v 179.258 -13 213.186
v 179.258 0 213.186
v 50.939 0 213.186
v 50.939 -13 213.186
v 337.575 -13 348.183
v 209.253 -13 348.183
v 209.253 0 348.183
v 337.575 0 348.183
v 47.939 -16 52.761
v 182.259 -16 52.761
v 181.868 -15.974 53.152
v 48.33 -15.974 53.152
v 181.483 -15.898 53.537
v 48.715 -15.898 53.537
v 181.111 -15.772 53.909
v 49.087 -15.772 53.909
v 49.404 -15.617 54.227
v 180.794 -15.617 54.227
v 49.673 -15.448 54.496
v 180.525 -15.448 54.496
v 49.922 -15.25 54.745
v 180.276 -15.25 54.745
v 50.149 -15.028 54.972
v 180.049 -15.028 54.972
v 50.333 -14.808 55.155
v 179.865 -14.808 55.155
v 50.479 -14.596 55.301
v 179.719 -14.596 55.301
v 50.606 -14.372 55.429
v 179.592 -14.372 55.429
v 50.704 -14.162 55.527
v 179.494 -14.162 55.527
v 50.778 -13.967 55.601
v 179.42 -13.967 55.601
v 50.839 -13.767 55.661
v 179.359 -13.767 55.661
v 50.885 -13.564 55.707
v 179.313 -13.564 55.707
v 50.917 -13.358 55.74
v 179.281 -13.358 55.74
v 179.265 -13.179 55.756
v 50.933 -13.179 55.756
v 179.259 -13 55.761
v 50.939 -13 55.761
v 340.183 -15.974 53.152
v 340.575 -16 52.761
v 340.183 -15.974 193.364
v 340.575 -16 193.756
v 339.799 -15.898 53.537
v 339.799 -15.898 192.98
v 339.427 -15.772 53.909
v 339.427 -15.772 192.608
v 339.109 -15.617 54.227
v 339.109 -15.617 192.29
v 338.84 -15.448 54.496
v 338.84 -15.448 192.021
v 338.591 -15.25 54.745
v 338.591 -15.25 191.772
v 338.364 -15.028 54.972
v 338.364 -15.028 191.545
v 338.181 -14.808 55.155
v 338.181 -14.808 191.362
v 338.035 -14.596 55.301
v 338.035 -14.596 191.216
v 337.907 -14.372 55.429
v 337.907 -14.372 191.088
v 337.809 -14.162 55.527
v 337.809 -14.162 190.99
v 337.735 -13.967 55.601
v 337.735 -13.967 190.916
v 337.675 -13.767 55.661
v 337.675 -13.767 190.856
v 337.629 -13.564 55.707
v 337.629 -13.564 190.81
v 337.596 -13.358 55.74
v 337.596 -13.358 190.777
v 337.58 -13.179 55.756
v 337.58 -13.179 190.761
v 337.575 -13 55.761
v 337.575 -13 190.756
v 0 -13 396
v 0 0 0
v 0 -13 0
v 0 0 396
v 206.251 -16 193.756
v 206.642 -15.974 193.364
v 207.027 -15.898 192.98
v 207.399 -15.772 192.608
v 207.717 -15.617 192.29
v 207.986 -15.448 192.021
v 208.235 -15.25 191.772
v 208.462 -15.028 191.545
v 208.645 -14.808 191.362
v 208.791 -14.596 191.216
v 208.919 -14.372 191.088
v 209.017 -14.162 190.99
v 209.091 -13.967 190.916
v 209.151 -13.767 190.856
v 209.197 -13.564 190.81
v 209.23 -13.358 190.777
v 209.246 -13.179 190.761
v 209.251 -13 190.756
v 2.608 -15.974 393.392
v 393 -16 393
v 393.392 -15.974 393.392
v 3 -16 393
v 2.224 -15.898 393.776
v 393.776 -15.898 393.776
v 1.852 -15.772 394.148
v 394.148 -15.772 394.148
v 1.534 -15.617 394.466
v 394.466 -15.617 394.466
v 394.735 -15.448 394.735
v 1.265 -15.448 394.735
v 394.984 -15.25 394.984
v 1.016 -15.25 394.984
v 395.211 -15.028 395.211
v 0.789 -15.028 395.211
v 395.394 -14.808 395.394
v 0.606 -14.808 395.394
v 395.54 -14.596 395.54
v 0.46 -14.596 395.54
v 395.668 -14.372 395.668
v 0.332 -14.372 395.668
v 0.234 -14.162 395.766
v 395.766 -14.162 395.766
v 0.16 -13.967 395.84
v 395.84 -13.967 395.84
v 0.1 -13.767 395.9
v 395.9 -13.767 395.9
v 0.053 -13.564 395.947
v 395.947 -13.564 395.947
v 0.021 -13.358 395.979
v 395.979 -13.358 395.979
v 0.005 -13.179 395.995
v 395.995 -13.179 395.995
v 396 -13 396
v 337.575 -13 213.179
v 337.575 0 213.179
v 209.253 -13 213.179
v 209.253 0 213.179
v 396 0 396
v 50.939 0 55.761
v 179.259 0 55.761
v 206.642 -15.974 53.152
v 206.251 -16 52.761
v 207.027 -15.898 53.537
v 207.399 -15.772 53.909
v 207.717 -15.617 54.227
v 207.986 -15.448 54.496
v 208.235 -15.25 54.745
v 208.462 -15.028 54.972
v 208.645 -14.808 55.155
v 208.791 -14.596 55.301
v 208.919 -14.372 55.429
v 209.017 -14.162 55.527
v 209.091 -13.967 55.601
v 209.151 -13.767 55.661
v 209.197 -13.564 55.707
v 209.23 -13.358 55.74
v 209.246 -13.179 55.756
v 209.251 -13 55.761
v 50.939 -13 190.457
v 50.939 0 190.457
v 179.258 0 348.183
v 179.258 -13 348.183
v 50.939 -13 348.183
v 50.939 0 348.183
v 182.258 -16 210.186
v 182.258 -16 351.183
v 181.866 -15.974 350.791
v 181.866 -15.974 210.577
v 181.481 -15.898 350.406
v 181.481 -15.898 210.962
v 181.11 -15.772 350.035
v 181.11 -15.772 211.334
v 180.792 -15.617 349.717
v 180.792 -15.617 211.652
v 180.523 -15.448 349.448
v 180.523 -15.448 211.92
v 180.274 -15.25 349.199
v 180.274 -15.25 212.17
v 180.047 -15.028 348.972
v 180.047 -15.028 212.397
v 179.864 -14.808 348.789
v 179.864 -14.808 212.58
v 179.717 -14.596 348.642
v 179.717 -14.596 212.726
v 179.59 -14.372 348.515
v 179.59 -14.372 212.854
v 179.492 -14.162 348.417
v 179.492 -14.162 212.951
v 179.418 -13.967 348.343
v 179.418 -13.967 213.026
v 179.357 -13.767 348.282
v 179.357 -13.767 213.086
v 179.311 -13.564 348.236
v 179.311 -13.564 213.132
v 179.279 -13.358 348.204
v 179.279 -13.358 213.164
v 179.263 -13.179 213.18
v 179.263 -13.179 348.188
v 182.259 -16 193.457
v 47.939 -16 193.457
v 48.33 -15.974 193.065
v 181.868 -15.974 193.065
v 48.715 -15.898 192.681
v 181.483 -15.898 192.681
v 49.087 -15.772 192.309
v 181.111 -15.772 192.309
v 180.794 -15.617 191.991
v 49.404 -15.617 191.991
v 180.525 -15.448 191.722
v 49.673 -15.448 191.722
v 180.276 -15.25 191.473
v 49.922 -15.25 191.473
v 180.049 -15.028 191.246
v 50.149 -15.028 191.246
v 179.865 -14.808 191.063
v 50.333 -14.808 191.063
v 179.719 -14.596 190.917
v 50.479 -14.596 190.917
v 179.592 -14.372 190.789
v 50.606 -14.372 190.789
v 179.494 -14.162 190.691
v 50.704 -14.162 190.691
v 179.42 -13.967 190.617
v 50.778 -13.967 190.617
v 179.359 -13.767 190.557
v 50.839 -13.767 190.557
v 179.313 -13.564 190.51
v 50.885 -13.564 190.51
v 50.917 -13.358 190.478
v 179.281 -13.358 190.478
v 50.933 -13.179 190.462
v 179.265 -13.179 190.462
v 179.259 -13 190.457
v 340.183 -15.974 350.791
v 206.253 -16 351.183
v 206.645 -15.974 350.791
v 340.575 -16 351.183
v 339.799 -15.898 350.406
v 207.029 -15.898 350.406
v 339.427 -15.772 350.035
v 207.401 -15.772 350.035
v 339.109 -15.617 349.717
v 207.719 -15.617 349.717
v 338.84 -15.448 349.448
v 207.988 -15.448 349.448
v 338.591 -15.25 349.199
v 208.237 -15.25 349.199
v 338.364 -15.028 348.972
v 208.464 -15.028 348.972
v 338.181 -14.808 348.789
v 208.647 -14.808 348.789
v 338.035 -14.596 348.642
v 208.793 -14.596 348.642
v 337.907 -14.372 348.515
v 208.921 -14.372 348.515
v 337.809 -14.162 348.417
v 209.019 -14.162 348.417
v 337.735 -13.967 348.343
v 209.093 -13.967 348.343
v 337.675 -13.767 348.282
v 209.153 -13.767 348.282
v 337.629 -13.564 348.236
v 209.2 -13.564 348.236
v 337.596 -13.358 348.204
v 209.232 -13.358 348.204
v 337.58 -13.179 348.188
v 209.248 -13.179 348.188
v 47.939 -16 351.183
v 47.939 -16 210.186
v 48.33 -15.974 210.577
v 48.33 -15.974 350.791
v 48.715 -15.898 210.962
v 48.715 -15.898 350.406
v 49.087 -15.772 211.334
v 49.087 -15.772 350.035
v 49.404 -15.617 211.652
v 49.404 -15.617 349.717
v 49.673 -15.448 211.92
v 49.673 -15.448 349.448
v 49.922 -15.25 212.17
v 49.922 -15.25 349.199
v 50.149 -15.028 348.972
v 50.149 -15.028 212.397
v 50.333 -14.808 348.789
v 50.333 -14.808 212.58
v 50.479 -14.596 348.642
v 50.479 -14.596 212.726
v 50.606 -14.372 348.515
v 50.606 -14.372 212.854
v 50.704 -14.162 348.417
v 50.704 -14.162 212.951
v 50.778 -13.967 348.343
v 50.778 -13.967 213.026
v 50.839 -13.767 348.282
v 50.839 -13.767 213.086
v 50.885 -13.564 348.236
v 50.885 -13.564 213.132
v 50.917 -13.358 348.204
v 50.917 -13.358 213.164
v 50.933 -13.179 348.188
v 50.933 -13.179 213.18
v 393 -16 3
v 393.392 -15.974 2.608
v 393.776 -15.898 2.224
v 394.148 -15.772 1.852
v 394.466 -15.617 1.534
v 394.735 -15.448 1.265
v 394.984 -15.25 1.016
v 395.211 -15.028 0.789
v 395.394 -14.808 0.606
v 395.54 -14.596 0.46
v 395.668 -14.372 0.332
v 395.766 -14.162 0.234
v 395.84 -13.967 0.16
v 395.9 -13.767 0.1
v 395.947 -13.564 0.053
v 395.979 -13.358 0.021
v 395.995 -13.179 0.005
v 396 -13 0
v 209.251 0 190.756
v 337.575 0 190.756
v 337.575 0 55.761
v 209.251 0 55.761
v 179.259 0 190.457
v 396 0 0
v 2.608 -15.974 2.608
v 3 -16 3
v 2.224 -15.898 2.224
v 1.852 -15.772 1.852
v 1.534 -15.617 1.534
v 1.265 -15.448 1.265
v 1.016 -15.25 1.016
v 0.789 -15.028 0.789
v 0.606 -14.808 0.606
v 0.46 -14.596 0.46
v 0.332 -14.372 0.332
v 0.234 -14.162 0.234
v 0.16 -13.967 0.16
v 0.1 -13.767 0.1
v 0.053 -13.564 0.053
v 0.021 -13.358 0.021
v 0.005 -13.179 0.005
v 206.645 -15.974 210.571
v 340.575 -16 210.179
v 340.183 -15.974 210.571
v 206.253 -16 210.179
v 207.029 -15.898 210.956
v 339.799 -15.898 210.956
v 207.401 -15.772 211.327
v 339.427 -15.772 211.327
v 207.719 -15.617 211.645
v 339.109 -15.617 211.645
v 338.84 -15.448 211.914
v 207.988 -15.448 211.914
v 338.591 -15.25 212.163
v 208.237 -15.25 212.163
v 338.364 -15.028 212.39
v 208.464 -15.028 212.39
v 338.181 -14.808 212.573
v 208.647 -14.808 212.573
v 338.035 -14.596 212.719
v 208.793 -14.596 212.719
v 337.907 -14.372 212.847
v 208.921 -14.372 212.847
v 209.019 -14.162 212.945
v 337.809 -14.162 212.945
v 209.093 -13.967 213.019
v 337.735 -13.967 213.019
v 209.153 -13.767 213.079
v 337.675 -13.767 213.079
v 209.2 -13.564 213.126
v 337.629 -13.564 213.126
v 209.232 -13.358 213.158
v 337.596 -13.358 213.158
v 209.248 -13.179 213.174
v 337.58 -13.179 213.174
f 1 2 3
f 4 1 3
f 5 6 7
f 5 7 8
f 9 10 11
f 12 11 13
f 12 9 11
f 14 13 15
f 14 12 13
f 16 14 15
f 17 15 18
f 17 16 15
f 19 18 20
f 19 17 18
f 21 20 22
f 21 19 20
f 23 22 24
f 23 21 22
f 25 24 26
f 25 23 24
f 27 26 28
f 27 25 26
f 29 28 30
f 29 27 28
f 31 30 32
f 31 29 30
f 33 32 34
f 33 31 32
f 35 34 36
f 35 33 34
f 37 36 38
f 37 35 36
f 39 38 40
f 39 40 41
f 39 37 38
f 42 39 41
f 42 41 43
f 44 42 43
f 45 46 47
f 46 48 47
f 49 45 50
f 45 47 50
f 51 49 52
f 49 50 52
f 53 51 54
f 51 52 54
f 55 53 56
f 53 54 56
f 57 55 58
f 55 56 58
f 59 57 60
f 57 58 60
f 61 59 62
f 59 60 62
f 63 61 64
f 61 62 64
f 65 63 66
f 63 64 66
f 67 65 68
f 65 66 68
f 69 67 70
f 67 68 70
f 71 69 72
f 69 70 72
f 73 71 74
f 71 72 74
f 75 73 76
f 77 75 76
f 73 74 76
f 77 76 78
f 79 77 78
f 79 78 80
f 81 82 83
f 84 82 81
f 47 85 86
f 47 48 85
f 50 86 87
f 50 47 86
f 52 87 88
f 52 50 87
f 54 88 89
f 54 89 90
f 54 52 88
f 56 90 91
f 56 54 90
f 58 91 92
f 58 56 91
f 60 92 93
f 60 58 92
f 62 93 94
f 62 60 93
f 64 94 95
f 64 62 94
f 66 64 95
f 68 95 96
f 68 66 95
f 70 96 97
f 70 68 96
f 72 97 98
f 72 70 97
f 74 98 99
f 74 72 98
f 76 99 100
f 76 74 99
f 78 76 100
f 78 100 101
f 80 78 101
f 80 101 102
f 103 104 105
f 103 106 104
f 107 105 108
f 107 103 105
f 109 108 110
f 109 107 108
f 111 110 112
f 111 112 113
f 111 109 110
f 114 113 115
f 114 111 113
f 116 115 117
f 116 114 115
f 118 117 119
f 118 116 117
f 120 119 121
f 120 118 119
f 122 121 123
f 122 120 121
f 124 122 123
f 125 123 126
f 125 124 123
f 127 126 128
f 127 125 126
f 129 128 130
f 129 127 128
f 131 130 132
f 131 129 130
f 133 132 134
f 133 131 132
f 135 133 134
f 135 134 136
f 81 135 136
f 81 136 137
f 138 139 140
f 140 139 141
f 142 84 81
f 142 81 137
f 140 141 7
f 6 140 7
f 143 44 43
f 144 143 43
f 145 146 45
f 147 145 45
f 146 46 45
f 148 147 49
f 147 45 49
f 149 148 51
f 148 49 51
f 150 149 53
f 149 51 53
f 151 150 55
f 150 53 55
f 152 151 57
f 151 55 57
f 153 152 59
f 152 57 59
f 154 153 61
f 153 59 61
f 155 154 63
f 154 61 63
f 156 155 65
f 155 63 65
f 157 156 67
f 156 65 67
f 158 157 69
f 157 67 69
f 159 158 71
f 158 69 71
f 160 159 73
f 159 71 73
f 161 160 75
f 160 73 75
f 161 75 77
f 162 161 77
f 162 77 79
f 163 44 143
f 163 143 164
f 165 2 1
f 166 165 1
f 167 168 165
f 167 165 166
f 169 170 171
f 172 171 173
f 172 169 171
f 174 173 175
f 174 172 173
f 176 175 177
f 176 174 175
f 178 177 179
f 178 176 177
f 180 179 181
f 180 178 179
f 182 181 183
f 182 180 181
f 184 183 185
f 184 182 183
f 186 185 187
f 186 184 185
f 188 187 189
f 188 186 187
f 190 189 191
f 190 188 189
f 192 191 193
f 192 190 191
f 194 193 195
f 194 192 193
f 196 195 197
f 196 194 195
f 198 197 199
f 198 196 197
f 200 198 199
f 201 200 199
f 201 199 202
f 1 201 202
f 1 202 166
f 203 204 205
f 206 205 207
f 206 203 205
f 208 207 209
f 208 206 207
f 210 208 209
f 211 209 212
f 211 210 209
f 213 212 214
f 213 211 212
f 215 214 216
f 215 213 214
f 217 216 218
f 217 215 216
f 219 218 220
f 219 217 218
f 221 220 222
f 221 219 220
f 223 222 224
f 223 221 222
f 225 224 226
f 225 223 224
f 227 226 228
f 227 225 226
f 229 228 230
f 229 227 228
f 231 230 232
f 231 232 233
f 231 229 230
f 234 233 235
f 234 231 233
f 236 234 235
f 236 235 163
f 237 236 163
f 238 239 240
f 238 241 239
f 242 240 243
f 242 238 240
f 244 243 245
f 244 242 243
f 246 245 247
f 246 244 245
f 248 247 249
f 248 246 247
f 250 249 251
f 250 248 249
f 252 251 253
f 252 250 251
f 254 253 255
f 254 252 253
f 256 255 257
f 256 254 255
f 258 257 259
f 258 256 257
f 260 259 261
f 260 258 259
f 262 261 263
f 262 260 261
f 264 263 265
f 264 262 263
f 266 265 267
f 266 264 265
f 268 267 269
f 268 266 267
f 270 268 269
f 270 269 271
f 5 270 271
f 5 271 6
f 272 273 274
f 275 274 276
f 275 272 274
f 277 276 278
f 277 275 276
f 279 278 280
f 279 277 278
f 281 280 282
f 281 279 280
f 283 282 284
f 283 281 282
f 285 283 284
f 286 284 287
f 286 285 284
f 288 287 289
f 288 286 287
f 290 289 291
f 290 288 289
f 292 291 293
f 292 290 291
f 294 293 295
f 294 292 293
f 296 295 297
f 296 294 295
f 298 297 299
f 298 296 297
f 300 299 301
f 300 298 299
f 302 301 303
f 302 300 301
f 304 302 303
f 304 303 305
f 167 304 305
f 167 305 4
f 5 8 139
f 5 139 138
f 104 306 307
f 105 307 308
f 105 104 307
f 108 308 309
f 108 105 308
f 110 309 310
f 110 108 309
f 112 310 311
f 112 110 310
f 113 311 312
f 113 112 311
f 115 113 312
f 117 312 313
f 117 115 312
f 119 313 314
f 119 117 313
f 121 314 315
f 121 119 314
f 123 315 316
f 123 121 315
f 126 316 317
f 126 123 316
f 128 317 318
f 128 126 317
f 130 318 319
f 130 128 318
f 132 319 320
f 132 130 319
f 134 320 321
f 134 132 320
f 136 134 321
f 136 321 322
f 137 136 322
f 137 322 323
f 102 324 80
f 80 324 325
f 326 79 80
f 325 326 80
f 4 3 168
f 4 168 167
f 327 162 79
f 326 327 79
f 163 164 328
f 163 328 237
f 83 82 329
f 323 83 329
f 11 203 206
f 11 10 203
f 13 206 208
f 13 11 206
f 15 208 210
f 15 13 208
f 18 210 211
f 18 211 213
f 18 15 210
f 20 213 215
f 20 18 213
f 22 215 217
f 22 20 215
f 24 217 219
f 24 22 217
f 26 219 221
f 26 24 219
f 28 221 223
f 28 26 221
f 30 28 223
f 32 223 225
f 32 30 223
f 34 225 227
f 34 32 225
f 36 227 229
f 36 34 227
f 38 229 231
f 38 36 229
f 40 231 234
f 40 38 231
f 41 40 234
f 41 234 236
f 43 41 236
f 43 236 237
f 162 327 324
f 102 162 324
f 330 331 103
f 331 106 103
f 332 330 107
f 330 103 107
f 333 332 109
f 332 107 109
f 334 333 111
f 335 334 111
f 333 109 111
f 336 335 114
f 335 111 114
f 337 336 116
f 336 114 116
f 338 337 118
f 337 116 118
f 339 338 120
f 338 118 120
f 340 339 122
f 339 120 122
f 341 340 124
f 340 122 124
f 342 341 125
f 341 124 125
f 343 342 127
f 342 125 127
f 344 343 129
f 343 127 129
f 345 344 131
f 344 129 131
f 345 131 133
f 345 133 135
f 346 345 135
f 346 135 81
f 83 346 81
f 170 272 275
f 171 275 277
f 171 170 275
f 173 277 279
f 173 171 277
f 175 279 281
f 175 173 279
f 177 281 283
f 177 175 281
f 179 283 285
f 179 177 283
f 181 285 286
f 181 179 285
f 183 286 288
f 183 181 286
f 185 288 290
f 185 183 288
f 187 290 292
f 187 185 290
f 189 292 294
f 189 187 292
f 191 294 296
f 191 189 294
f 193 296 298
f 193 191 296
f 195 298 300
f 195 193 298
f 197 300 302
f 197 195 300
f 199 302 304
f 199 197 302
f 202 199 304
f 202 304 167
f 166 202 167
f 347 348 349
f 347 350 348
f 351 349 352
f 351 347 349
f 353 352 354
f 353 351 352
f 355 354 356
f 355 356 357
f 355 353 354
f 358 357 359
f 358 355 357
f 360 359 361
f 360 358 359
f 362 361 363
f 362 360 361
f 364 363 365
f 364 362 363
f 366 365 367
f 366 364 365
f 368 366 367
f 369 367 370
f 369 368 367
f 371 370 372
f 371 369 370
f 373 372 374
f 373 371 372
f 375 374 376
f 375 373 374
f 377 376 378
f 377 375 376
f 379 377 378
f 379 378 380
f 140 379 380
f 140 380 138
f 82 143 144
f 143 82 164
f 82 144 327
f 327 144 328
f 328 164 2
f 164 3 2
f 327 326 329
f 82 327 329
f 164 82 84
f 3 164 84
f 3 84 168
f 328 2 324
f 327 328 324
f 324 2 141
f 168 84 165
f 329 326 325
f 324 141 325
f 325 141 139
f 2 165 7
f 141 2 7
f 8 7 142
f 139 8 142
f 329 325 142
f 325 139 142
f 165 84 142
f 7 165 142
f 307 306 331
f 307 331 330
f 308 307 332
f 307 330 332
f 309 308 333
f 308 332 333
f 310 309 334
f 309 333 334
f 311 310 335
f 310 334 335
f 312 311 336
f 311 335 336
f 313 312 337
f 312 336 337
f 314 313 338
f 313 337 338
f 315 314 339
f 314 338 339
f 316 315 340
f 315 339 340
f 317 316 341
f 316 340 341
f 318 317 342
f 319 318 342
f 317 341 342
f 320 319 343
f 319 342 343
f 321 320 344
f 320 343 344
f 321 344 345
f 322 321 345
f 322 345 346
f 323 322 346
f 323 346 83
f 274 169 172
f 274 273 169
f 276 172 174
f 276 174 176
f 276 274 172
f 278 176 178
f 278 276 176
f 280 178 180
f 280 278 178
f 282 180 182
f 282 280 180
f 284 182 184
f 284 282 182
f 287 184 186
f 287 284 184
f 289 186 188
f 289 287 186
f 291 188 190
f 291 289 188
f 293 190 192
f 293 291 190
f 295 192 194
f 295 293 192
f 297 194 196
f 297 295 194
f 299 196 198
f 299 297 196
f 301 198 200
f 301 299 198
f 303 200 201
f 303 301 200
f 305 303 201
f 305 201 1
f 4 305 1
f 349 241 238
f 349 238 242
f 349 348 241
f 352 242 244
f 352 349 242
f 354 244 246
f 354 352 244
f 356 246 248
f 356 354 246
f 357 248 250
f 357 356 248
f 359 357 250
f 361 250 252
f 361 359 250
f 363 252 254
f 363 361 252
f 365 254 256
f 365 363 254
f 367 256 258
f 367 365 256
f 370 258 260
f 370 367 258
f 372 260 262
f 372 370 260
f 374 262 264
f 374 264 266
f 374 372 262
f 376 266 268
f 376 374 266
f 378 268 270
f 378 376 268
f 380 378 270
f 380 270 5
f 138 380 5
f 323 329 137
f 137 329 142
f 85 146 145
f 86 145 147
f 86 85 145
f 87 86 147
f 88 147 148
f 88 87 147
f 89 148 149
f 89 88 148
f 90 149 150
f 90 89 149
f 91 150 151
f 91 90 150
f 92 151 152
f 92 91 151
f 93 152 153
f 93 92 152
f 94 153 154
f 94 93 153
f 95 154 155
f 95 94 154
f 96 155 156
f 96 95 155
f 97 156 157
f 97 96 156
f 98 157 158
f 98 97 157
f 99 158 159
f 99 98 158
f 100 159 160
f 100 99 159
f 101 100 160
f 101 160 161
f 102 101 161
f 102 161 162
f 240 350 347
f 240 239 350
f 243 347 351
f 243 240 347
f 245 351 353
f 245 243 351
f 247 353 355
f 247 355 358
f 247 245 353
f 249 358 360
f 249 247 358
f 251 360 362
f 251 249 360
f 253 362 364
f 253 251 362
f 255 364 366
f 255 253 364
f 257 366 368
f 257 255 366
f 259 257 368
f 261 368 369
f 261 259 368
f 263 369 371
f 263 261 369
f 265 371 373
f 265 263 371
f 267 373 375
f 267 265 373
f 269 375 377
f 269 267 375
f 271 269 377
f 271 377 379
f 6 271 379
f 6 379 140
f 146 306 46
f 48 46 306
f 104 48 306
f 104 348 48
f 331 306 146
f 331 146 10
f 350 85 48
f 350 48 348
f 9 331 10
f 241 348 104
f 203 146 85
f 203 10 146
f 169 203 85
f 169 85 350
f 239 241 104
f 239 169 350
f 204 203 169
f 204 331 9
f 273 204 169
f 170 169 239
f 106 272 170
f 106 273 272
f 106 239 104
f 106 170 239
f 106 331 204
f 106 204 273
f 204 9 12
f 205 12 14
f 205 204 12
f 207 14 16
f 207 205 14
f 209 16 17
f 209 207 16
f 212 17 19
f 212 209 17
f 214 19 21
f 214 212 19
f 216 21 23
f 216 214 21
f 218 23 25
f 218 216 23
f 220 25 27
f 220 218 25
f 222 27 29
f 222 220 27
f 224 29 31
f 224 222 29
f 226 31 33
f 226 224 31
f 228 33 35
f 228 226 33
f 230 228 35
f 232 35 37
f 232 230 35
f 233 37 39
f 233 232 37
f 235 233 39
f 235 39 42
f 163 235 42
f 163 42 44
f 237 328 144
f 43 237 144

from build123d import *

# Parameters (mm, degrees)
F0_W      = 46.2659336627
F0_H      = 37.4186895788
F1_DEPTH  = 16
F2_DEPTH  = 396
F3_DEPTH  = 396
F4_W      = 286.636531353
F4_H      = 292.4217879772
F5_DEPTH  = 5
F7_DEPTH  = 5
F8_DEPTH  = 24.58
F9_DEPTH  = 28.59
F10_DEPTH = 44.51
F11_DEPTH = 43.6
F12_DEPTH = 23.54
F13_DEPTH = 25.39
F14_DEPTH = 8.54
F15_DEPTH = 6.68
F16_DEPTH = 6.68
F17_DEPTH = 6.68
F18_DEPTH = 1.72
F19_DEPTH = 11
F20_R     = 3


with BuildPart() as f1:
    # F0 (on Front) → F1 (new body)
    with BuildSketch(Plane.XZ):
        with Locations((23.1329668313, 18.7093447894)):
            Rectangle(F0_W, F0_H)
    extrude(amount=F1_DEPTH)

    # F2 (add): a face of the model
    f2_faces = [f1.faces().sort_by_distance(p)[0] for p in [
        (0, -8, 18.7093447894),
    ]]
    extrude(f2_faces, amount=-F2_DEPTH)

    # F3 (add): a face of the model
    f3_faces = [f1.faces().sort_by_distance(p)[0] for p in [
        (198, -8, 0),
    ]]
    extrude(f3_faces, amount=-F3_DEPTH)

    # F4 (on face) → F5 (cut)
    with BuildSketch(Plane.XZ.offset(16)):
        with Locations((194.2568123341, 201.971784234)):
            Rectangle(F4_W, F4_H)
    extrude(amount=-F5_DEPTH, mode=Mode.SUBTRACT)

    # F6 (on face) → F7 (join)
    with BuildSketch(Plane.XZ.offset(11)):
        Polygon((211.1129611731, 348.1826782227), (162.3977422714, 348.1826782227), (162.3977422714, 257.6956450939), (50.9385466576, 257.6956450939), (50.9385466576, 215.037047863), (160.5494618416, 215.037047863), (160.5494618416, 55.7608902454), (207.5308859348, 55.7608902454), (207.5308859348, 219.3460762501), (337.5750780106, 219.3460762501), (337.5750780106, 256.7791342735), (211.1129611731, 256.7791342735), align=None)
    extrude(amount=F7_DEPTH)

    # F8 (add): a face of the model
    f8_faces = [f1.faces().sort_by_distance(p)[0] for p in [
        (105.7440042496, -13.5, 215.037047863),
    ]]
    extrude(f8_faces, amount=F8_DEPTH)

    # F9 (add): a face of the model
    f9_faces = [f1.faces().sort_by_distance(p)[0] for p in [
        (272.5529819727, -13.5, 219.3460762501),
    ]]
    extrude(f9_faces, amount=F9_DEPTH)

    # F10 (cut): a face of the model
    f10_faces = [f1.faces().sort_by_distance(p)[0] for p in [
        (106.6681444645, -13.5, 257.6956450939),
    ]]
    extrude(f10_faces, amount=-F10_DEPTH, mode=Mode.SUBTRACT)

    # F11 (cut): a face of the model
    f11_faces = [f1.faces().sort_by_distance(p)[0] for p in [
        (274.3440195918, -13.5, 256.7791342735),
    ]]
    extrude(f11_faces, amount=-F11_DEPTH, mode=Mode.SUBTRACT)

    # F12 (cut): a face of the model
    f12_faces = [f1.faces().sort_by_distance(p)[0] for p in [
        (162.3977422714, -13.5, 280.6841616583),
    ]]
    extrude(f12_faces, amount=-F12_DEPTH, mode=Mode.SUBTRACT)

    # F13 (cut): a face of the model
    f13_faces = [f1.faces().sort_by_distance(p)[0] for p in [
        (160.5494618416, -13.5, 123.1089690542),
    ]]
    extrude(f13_faces, amount=-F13_DEPTH, mode=Mode.SUBTRACT)

    # F14 (cut): a face of the model
    f14_faces = [f1.faces().sort_by_distance(p)[0] for p in [
        (211.1129611731, -13.5, 280.6809062481),
    ]]
    extrude(f14_faces, amount=-F14_DEPTH, mode=Mode.SUBTRACT)

    # F15 (add): a face of the model
    f15_faces = [f1.faces().sort_by_distance(p)[0] for p in [
        (185.9377422714, -13.5, 280.6841616583),
    ]]
    extrude(f15_faces, amount=F15_DEPTH)

    # F16 (add): a face of the model
    f16_faces = [f1.faces().sort_by_distance(p)[0] for p in [
        (202.5729611731, -13.5, 280.6809062481),
    ]]
    extrude(f16_faces, amount=F16_DEPTH)

    # F17 (add): a face of the model
    f17_faces = [f1.faces().sort_by_distance(p)[0] for p in [
        (185.9394618416, -13.5, 123.1089690542),
    ]]
    extrude(f17_faces, amount=F17_DEPTH)

    # F18 (add): a face of the model
    f18_faces = [f1.faces().sort_by_distance(p)[0] for p in [
        (207.5308859348, -13.5, 123.2584832478),
    ]]
    extrude(f18_faces, amount=F18_DEPTH)

    # F19 (cut): faces of the model
    f19_faces = [f1.faces().sort_by_distance(p)[0] for p in [
        (115.0990042496, -11, 123.1089690542),
        (273.4140195918, -11, 280.6809062481),
        (273.4129819727, -11, 123.2584832478),
        (115.0981444645, -11, 280.6841616583),
    ]]
    extrude(f19_faces, amount=-F19_DEPTH, mode=Mode.SUBTRACT)

    # F20
    f20_edges = [f1.edges().sort_by_distance(p)[0] for p in [
        (0, -16, 198),
        (198, -16, 0),
        (396, -16, 198),
        (198, -16, 396),
        (50.938547, -16, 123.108969),
        (115.099004, -16, 190.457048),
        (179.259462, -16, 123.108969),
        (115.099004, -16, 55.76089),
        (273.412982, -16, 55.76089),
        (209.250886, -16, 123.258483),
        (273.412982, -16, 190.756076),
        (337.575078, -16, 123.258483),
        (115.098144, -16, 348.182678),
        (179.257742, -16, 280.684162),
        (115.098144, -16, 213.185645),
        (50.938547, -16, 280.684162),
        (273.41402, -16, 348.182678),
        (337.575078, -16, 280.680906),
        (273.41402, -16, 213.179134),
        (209.252961, -16, 280.680906),
    ]]
    fillet(f20_edges, radius=F20_R)


solid = f1.part
